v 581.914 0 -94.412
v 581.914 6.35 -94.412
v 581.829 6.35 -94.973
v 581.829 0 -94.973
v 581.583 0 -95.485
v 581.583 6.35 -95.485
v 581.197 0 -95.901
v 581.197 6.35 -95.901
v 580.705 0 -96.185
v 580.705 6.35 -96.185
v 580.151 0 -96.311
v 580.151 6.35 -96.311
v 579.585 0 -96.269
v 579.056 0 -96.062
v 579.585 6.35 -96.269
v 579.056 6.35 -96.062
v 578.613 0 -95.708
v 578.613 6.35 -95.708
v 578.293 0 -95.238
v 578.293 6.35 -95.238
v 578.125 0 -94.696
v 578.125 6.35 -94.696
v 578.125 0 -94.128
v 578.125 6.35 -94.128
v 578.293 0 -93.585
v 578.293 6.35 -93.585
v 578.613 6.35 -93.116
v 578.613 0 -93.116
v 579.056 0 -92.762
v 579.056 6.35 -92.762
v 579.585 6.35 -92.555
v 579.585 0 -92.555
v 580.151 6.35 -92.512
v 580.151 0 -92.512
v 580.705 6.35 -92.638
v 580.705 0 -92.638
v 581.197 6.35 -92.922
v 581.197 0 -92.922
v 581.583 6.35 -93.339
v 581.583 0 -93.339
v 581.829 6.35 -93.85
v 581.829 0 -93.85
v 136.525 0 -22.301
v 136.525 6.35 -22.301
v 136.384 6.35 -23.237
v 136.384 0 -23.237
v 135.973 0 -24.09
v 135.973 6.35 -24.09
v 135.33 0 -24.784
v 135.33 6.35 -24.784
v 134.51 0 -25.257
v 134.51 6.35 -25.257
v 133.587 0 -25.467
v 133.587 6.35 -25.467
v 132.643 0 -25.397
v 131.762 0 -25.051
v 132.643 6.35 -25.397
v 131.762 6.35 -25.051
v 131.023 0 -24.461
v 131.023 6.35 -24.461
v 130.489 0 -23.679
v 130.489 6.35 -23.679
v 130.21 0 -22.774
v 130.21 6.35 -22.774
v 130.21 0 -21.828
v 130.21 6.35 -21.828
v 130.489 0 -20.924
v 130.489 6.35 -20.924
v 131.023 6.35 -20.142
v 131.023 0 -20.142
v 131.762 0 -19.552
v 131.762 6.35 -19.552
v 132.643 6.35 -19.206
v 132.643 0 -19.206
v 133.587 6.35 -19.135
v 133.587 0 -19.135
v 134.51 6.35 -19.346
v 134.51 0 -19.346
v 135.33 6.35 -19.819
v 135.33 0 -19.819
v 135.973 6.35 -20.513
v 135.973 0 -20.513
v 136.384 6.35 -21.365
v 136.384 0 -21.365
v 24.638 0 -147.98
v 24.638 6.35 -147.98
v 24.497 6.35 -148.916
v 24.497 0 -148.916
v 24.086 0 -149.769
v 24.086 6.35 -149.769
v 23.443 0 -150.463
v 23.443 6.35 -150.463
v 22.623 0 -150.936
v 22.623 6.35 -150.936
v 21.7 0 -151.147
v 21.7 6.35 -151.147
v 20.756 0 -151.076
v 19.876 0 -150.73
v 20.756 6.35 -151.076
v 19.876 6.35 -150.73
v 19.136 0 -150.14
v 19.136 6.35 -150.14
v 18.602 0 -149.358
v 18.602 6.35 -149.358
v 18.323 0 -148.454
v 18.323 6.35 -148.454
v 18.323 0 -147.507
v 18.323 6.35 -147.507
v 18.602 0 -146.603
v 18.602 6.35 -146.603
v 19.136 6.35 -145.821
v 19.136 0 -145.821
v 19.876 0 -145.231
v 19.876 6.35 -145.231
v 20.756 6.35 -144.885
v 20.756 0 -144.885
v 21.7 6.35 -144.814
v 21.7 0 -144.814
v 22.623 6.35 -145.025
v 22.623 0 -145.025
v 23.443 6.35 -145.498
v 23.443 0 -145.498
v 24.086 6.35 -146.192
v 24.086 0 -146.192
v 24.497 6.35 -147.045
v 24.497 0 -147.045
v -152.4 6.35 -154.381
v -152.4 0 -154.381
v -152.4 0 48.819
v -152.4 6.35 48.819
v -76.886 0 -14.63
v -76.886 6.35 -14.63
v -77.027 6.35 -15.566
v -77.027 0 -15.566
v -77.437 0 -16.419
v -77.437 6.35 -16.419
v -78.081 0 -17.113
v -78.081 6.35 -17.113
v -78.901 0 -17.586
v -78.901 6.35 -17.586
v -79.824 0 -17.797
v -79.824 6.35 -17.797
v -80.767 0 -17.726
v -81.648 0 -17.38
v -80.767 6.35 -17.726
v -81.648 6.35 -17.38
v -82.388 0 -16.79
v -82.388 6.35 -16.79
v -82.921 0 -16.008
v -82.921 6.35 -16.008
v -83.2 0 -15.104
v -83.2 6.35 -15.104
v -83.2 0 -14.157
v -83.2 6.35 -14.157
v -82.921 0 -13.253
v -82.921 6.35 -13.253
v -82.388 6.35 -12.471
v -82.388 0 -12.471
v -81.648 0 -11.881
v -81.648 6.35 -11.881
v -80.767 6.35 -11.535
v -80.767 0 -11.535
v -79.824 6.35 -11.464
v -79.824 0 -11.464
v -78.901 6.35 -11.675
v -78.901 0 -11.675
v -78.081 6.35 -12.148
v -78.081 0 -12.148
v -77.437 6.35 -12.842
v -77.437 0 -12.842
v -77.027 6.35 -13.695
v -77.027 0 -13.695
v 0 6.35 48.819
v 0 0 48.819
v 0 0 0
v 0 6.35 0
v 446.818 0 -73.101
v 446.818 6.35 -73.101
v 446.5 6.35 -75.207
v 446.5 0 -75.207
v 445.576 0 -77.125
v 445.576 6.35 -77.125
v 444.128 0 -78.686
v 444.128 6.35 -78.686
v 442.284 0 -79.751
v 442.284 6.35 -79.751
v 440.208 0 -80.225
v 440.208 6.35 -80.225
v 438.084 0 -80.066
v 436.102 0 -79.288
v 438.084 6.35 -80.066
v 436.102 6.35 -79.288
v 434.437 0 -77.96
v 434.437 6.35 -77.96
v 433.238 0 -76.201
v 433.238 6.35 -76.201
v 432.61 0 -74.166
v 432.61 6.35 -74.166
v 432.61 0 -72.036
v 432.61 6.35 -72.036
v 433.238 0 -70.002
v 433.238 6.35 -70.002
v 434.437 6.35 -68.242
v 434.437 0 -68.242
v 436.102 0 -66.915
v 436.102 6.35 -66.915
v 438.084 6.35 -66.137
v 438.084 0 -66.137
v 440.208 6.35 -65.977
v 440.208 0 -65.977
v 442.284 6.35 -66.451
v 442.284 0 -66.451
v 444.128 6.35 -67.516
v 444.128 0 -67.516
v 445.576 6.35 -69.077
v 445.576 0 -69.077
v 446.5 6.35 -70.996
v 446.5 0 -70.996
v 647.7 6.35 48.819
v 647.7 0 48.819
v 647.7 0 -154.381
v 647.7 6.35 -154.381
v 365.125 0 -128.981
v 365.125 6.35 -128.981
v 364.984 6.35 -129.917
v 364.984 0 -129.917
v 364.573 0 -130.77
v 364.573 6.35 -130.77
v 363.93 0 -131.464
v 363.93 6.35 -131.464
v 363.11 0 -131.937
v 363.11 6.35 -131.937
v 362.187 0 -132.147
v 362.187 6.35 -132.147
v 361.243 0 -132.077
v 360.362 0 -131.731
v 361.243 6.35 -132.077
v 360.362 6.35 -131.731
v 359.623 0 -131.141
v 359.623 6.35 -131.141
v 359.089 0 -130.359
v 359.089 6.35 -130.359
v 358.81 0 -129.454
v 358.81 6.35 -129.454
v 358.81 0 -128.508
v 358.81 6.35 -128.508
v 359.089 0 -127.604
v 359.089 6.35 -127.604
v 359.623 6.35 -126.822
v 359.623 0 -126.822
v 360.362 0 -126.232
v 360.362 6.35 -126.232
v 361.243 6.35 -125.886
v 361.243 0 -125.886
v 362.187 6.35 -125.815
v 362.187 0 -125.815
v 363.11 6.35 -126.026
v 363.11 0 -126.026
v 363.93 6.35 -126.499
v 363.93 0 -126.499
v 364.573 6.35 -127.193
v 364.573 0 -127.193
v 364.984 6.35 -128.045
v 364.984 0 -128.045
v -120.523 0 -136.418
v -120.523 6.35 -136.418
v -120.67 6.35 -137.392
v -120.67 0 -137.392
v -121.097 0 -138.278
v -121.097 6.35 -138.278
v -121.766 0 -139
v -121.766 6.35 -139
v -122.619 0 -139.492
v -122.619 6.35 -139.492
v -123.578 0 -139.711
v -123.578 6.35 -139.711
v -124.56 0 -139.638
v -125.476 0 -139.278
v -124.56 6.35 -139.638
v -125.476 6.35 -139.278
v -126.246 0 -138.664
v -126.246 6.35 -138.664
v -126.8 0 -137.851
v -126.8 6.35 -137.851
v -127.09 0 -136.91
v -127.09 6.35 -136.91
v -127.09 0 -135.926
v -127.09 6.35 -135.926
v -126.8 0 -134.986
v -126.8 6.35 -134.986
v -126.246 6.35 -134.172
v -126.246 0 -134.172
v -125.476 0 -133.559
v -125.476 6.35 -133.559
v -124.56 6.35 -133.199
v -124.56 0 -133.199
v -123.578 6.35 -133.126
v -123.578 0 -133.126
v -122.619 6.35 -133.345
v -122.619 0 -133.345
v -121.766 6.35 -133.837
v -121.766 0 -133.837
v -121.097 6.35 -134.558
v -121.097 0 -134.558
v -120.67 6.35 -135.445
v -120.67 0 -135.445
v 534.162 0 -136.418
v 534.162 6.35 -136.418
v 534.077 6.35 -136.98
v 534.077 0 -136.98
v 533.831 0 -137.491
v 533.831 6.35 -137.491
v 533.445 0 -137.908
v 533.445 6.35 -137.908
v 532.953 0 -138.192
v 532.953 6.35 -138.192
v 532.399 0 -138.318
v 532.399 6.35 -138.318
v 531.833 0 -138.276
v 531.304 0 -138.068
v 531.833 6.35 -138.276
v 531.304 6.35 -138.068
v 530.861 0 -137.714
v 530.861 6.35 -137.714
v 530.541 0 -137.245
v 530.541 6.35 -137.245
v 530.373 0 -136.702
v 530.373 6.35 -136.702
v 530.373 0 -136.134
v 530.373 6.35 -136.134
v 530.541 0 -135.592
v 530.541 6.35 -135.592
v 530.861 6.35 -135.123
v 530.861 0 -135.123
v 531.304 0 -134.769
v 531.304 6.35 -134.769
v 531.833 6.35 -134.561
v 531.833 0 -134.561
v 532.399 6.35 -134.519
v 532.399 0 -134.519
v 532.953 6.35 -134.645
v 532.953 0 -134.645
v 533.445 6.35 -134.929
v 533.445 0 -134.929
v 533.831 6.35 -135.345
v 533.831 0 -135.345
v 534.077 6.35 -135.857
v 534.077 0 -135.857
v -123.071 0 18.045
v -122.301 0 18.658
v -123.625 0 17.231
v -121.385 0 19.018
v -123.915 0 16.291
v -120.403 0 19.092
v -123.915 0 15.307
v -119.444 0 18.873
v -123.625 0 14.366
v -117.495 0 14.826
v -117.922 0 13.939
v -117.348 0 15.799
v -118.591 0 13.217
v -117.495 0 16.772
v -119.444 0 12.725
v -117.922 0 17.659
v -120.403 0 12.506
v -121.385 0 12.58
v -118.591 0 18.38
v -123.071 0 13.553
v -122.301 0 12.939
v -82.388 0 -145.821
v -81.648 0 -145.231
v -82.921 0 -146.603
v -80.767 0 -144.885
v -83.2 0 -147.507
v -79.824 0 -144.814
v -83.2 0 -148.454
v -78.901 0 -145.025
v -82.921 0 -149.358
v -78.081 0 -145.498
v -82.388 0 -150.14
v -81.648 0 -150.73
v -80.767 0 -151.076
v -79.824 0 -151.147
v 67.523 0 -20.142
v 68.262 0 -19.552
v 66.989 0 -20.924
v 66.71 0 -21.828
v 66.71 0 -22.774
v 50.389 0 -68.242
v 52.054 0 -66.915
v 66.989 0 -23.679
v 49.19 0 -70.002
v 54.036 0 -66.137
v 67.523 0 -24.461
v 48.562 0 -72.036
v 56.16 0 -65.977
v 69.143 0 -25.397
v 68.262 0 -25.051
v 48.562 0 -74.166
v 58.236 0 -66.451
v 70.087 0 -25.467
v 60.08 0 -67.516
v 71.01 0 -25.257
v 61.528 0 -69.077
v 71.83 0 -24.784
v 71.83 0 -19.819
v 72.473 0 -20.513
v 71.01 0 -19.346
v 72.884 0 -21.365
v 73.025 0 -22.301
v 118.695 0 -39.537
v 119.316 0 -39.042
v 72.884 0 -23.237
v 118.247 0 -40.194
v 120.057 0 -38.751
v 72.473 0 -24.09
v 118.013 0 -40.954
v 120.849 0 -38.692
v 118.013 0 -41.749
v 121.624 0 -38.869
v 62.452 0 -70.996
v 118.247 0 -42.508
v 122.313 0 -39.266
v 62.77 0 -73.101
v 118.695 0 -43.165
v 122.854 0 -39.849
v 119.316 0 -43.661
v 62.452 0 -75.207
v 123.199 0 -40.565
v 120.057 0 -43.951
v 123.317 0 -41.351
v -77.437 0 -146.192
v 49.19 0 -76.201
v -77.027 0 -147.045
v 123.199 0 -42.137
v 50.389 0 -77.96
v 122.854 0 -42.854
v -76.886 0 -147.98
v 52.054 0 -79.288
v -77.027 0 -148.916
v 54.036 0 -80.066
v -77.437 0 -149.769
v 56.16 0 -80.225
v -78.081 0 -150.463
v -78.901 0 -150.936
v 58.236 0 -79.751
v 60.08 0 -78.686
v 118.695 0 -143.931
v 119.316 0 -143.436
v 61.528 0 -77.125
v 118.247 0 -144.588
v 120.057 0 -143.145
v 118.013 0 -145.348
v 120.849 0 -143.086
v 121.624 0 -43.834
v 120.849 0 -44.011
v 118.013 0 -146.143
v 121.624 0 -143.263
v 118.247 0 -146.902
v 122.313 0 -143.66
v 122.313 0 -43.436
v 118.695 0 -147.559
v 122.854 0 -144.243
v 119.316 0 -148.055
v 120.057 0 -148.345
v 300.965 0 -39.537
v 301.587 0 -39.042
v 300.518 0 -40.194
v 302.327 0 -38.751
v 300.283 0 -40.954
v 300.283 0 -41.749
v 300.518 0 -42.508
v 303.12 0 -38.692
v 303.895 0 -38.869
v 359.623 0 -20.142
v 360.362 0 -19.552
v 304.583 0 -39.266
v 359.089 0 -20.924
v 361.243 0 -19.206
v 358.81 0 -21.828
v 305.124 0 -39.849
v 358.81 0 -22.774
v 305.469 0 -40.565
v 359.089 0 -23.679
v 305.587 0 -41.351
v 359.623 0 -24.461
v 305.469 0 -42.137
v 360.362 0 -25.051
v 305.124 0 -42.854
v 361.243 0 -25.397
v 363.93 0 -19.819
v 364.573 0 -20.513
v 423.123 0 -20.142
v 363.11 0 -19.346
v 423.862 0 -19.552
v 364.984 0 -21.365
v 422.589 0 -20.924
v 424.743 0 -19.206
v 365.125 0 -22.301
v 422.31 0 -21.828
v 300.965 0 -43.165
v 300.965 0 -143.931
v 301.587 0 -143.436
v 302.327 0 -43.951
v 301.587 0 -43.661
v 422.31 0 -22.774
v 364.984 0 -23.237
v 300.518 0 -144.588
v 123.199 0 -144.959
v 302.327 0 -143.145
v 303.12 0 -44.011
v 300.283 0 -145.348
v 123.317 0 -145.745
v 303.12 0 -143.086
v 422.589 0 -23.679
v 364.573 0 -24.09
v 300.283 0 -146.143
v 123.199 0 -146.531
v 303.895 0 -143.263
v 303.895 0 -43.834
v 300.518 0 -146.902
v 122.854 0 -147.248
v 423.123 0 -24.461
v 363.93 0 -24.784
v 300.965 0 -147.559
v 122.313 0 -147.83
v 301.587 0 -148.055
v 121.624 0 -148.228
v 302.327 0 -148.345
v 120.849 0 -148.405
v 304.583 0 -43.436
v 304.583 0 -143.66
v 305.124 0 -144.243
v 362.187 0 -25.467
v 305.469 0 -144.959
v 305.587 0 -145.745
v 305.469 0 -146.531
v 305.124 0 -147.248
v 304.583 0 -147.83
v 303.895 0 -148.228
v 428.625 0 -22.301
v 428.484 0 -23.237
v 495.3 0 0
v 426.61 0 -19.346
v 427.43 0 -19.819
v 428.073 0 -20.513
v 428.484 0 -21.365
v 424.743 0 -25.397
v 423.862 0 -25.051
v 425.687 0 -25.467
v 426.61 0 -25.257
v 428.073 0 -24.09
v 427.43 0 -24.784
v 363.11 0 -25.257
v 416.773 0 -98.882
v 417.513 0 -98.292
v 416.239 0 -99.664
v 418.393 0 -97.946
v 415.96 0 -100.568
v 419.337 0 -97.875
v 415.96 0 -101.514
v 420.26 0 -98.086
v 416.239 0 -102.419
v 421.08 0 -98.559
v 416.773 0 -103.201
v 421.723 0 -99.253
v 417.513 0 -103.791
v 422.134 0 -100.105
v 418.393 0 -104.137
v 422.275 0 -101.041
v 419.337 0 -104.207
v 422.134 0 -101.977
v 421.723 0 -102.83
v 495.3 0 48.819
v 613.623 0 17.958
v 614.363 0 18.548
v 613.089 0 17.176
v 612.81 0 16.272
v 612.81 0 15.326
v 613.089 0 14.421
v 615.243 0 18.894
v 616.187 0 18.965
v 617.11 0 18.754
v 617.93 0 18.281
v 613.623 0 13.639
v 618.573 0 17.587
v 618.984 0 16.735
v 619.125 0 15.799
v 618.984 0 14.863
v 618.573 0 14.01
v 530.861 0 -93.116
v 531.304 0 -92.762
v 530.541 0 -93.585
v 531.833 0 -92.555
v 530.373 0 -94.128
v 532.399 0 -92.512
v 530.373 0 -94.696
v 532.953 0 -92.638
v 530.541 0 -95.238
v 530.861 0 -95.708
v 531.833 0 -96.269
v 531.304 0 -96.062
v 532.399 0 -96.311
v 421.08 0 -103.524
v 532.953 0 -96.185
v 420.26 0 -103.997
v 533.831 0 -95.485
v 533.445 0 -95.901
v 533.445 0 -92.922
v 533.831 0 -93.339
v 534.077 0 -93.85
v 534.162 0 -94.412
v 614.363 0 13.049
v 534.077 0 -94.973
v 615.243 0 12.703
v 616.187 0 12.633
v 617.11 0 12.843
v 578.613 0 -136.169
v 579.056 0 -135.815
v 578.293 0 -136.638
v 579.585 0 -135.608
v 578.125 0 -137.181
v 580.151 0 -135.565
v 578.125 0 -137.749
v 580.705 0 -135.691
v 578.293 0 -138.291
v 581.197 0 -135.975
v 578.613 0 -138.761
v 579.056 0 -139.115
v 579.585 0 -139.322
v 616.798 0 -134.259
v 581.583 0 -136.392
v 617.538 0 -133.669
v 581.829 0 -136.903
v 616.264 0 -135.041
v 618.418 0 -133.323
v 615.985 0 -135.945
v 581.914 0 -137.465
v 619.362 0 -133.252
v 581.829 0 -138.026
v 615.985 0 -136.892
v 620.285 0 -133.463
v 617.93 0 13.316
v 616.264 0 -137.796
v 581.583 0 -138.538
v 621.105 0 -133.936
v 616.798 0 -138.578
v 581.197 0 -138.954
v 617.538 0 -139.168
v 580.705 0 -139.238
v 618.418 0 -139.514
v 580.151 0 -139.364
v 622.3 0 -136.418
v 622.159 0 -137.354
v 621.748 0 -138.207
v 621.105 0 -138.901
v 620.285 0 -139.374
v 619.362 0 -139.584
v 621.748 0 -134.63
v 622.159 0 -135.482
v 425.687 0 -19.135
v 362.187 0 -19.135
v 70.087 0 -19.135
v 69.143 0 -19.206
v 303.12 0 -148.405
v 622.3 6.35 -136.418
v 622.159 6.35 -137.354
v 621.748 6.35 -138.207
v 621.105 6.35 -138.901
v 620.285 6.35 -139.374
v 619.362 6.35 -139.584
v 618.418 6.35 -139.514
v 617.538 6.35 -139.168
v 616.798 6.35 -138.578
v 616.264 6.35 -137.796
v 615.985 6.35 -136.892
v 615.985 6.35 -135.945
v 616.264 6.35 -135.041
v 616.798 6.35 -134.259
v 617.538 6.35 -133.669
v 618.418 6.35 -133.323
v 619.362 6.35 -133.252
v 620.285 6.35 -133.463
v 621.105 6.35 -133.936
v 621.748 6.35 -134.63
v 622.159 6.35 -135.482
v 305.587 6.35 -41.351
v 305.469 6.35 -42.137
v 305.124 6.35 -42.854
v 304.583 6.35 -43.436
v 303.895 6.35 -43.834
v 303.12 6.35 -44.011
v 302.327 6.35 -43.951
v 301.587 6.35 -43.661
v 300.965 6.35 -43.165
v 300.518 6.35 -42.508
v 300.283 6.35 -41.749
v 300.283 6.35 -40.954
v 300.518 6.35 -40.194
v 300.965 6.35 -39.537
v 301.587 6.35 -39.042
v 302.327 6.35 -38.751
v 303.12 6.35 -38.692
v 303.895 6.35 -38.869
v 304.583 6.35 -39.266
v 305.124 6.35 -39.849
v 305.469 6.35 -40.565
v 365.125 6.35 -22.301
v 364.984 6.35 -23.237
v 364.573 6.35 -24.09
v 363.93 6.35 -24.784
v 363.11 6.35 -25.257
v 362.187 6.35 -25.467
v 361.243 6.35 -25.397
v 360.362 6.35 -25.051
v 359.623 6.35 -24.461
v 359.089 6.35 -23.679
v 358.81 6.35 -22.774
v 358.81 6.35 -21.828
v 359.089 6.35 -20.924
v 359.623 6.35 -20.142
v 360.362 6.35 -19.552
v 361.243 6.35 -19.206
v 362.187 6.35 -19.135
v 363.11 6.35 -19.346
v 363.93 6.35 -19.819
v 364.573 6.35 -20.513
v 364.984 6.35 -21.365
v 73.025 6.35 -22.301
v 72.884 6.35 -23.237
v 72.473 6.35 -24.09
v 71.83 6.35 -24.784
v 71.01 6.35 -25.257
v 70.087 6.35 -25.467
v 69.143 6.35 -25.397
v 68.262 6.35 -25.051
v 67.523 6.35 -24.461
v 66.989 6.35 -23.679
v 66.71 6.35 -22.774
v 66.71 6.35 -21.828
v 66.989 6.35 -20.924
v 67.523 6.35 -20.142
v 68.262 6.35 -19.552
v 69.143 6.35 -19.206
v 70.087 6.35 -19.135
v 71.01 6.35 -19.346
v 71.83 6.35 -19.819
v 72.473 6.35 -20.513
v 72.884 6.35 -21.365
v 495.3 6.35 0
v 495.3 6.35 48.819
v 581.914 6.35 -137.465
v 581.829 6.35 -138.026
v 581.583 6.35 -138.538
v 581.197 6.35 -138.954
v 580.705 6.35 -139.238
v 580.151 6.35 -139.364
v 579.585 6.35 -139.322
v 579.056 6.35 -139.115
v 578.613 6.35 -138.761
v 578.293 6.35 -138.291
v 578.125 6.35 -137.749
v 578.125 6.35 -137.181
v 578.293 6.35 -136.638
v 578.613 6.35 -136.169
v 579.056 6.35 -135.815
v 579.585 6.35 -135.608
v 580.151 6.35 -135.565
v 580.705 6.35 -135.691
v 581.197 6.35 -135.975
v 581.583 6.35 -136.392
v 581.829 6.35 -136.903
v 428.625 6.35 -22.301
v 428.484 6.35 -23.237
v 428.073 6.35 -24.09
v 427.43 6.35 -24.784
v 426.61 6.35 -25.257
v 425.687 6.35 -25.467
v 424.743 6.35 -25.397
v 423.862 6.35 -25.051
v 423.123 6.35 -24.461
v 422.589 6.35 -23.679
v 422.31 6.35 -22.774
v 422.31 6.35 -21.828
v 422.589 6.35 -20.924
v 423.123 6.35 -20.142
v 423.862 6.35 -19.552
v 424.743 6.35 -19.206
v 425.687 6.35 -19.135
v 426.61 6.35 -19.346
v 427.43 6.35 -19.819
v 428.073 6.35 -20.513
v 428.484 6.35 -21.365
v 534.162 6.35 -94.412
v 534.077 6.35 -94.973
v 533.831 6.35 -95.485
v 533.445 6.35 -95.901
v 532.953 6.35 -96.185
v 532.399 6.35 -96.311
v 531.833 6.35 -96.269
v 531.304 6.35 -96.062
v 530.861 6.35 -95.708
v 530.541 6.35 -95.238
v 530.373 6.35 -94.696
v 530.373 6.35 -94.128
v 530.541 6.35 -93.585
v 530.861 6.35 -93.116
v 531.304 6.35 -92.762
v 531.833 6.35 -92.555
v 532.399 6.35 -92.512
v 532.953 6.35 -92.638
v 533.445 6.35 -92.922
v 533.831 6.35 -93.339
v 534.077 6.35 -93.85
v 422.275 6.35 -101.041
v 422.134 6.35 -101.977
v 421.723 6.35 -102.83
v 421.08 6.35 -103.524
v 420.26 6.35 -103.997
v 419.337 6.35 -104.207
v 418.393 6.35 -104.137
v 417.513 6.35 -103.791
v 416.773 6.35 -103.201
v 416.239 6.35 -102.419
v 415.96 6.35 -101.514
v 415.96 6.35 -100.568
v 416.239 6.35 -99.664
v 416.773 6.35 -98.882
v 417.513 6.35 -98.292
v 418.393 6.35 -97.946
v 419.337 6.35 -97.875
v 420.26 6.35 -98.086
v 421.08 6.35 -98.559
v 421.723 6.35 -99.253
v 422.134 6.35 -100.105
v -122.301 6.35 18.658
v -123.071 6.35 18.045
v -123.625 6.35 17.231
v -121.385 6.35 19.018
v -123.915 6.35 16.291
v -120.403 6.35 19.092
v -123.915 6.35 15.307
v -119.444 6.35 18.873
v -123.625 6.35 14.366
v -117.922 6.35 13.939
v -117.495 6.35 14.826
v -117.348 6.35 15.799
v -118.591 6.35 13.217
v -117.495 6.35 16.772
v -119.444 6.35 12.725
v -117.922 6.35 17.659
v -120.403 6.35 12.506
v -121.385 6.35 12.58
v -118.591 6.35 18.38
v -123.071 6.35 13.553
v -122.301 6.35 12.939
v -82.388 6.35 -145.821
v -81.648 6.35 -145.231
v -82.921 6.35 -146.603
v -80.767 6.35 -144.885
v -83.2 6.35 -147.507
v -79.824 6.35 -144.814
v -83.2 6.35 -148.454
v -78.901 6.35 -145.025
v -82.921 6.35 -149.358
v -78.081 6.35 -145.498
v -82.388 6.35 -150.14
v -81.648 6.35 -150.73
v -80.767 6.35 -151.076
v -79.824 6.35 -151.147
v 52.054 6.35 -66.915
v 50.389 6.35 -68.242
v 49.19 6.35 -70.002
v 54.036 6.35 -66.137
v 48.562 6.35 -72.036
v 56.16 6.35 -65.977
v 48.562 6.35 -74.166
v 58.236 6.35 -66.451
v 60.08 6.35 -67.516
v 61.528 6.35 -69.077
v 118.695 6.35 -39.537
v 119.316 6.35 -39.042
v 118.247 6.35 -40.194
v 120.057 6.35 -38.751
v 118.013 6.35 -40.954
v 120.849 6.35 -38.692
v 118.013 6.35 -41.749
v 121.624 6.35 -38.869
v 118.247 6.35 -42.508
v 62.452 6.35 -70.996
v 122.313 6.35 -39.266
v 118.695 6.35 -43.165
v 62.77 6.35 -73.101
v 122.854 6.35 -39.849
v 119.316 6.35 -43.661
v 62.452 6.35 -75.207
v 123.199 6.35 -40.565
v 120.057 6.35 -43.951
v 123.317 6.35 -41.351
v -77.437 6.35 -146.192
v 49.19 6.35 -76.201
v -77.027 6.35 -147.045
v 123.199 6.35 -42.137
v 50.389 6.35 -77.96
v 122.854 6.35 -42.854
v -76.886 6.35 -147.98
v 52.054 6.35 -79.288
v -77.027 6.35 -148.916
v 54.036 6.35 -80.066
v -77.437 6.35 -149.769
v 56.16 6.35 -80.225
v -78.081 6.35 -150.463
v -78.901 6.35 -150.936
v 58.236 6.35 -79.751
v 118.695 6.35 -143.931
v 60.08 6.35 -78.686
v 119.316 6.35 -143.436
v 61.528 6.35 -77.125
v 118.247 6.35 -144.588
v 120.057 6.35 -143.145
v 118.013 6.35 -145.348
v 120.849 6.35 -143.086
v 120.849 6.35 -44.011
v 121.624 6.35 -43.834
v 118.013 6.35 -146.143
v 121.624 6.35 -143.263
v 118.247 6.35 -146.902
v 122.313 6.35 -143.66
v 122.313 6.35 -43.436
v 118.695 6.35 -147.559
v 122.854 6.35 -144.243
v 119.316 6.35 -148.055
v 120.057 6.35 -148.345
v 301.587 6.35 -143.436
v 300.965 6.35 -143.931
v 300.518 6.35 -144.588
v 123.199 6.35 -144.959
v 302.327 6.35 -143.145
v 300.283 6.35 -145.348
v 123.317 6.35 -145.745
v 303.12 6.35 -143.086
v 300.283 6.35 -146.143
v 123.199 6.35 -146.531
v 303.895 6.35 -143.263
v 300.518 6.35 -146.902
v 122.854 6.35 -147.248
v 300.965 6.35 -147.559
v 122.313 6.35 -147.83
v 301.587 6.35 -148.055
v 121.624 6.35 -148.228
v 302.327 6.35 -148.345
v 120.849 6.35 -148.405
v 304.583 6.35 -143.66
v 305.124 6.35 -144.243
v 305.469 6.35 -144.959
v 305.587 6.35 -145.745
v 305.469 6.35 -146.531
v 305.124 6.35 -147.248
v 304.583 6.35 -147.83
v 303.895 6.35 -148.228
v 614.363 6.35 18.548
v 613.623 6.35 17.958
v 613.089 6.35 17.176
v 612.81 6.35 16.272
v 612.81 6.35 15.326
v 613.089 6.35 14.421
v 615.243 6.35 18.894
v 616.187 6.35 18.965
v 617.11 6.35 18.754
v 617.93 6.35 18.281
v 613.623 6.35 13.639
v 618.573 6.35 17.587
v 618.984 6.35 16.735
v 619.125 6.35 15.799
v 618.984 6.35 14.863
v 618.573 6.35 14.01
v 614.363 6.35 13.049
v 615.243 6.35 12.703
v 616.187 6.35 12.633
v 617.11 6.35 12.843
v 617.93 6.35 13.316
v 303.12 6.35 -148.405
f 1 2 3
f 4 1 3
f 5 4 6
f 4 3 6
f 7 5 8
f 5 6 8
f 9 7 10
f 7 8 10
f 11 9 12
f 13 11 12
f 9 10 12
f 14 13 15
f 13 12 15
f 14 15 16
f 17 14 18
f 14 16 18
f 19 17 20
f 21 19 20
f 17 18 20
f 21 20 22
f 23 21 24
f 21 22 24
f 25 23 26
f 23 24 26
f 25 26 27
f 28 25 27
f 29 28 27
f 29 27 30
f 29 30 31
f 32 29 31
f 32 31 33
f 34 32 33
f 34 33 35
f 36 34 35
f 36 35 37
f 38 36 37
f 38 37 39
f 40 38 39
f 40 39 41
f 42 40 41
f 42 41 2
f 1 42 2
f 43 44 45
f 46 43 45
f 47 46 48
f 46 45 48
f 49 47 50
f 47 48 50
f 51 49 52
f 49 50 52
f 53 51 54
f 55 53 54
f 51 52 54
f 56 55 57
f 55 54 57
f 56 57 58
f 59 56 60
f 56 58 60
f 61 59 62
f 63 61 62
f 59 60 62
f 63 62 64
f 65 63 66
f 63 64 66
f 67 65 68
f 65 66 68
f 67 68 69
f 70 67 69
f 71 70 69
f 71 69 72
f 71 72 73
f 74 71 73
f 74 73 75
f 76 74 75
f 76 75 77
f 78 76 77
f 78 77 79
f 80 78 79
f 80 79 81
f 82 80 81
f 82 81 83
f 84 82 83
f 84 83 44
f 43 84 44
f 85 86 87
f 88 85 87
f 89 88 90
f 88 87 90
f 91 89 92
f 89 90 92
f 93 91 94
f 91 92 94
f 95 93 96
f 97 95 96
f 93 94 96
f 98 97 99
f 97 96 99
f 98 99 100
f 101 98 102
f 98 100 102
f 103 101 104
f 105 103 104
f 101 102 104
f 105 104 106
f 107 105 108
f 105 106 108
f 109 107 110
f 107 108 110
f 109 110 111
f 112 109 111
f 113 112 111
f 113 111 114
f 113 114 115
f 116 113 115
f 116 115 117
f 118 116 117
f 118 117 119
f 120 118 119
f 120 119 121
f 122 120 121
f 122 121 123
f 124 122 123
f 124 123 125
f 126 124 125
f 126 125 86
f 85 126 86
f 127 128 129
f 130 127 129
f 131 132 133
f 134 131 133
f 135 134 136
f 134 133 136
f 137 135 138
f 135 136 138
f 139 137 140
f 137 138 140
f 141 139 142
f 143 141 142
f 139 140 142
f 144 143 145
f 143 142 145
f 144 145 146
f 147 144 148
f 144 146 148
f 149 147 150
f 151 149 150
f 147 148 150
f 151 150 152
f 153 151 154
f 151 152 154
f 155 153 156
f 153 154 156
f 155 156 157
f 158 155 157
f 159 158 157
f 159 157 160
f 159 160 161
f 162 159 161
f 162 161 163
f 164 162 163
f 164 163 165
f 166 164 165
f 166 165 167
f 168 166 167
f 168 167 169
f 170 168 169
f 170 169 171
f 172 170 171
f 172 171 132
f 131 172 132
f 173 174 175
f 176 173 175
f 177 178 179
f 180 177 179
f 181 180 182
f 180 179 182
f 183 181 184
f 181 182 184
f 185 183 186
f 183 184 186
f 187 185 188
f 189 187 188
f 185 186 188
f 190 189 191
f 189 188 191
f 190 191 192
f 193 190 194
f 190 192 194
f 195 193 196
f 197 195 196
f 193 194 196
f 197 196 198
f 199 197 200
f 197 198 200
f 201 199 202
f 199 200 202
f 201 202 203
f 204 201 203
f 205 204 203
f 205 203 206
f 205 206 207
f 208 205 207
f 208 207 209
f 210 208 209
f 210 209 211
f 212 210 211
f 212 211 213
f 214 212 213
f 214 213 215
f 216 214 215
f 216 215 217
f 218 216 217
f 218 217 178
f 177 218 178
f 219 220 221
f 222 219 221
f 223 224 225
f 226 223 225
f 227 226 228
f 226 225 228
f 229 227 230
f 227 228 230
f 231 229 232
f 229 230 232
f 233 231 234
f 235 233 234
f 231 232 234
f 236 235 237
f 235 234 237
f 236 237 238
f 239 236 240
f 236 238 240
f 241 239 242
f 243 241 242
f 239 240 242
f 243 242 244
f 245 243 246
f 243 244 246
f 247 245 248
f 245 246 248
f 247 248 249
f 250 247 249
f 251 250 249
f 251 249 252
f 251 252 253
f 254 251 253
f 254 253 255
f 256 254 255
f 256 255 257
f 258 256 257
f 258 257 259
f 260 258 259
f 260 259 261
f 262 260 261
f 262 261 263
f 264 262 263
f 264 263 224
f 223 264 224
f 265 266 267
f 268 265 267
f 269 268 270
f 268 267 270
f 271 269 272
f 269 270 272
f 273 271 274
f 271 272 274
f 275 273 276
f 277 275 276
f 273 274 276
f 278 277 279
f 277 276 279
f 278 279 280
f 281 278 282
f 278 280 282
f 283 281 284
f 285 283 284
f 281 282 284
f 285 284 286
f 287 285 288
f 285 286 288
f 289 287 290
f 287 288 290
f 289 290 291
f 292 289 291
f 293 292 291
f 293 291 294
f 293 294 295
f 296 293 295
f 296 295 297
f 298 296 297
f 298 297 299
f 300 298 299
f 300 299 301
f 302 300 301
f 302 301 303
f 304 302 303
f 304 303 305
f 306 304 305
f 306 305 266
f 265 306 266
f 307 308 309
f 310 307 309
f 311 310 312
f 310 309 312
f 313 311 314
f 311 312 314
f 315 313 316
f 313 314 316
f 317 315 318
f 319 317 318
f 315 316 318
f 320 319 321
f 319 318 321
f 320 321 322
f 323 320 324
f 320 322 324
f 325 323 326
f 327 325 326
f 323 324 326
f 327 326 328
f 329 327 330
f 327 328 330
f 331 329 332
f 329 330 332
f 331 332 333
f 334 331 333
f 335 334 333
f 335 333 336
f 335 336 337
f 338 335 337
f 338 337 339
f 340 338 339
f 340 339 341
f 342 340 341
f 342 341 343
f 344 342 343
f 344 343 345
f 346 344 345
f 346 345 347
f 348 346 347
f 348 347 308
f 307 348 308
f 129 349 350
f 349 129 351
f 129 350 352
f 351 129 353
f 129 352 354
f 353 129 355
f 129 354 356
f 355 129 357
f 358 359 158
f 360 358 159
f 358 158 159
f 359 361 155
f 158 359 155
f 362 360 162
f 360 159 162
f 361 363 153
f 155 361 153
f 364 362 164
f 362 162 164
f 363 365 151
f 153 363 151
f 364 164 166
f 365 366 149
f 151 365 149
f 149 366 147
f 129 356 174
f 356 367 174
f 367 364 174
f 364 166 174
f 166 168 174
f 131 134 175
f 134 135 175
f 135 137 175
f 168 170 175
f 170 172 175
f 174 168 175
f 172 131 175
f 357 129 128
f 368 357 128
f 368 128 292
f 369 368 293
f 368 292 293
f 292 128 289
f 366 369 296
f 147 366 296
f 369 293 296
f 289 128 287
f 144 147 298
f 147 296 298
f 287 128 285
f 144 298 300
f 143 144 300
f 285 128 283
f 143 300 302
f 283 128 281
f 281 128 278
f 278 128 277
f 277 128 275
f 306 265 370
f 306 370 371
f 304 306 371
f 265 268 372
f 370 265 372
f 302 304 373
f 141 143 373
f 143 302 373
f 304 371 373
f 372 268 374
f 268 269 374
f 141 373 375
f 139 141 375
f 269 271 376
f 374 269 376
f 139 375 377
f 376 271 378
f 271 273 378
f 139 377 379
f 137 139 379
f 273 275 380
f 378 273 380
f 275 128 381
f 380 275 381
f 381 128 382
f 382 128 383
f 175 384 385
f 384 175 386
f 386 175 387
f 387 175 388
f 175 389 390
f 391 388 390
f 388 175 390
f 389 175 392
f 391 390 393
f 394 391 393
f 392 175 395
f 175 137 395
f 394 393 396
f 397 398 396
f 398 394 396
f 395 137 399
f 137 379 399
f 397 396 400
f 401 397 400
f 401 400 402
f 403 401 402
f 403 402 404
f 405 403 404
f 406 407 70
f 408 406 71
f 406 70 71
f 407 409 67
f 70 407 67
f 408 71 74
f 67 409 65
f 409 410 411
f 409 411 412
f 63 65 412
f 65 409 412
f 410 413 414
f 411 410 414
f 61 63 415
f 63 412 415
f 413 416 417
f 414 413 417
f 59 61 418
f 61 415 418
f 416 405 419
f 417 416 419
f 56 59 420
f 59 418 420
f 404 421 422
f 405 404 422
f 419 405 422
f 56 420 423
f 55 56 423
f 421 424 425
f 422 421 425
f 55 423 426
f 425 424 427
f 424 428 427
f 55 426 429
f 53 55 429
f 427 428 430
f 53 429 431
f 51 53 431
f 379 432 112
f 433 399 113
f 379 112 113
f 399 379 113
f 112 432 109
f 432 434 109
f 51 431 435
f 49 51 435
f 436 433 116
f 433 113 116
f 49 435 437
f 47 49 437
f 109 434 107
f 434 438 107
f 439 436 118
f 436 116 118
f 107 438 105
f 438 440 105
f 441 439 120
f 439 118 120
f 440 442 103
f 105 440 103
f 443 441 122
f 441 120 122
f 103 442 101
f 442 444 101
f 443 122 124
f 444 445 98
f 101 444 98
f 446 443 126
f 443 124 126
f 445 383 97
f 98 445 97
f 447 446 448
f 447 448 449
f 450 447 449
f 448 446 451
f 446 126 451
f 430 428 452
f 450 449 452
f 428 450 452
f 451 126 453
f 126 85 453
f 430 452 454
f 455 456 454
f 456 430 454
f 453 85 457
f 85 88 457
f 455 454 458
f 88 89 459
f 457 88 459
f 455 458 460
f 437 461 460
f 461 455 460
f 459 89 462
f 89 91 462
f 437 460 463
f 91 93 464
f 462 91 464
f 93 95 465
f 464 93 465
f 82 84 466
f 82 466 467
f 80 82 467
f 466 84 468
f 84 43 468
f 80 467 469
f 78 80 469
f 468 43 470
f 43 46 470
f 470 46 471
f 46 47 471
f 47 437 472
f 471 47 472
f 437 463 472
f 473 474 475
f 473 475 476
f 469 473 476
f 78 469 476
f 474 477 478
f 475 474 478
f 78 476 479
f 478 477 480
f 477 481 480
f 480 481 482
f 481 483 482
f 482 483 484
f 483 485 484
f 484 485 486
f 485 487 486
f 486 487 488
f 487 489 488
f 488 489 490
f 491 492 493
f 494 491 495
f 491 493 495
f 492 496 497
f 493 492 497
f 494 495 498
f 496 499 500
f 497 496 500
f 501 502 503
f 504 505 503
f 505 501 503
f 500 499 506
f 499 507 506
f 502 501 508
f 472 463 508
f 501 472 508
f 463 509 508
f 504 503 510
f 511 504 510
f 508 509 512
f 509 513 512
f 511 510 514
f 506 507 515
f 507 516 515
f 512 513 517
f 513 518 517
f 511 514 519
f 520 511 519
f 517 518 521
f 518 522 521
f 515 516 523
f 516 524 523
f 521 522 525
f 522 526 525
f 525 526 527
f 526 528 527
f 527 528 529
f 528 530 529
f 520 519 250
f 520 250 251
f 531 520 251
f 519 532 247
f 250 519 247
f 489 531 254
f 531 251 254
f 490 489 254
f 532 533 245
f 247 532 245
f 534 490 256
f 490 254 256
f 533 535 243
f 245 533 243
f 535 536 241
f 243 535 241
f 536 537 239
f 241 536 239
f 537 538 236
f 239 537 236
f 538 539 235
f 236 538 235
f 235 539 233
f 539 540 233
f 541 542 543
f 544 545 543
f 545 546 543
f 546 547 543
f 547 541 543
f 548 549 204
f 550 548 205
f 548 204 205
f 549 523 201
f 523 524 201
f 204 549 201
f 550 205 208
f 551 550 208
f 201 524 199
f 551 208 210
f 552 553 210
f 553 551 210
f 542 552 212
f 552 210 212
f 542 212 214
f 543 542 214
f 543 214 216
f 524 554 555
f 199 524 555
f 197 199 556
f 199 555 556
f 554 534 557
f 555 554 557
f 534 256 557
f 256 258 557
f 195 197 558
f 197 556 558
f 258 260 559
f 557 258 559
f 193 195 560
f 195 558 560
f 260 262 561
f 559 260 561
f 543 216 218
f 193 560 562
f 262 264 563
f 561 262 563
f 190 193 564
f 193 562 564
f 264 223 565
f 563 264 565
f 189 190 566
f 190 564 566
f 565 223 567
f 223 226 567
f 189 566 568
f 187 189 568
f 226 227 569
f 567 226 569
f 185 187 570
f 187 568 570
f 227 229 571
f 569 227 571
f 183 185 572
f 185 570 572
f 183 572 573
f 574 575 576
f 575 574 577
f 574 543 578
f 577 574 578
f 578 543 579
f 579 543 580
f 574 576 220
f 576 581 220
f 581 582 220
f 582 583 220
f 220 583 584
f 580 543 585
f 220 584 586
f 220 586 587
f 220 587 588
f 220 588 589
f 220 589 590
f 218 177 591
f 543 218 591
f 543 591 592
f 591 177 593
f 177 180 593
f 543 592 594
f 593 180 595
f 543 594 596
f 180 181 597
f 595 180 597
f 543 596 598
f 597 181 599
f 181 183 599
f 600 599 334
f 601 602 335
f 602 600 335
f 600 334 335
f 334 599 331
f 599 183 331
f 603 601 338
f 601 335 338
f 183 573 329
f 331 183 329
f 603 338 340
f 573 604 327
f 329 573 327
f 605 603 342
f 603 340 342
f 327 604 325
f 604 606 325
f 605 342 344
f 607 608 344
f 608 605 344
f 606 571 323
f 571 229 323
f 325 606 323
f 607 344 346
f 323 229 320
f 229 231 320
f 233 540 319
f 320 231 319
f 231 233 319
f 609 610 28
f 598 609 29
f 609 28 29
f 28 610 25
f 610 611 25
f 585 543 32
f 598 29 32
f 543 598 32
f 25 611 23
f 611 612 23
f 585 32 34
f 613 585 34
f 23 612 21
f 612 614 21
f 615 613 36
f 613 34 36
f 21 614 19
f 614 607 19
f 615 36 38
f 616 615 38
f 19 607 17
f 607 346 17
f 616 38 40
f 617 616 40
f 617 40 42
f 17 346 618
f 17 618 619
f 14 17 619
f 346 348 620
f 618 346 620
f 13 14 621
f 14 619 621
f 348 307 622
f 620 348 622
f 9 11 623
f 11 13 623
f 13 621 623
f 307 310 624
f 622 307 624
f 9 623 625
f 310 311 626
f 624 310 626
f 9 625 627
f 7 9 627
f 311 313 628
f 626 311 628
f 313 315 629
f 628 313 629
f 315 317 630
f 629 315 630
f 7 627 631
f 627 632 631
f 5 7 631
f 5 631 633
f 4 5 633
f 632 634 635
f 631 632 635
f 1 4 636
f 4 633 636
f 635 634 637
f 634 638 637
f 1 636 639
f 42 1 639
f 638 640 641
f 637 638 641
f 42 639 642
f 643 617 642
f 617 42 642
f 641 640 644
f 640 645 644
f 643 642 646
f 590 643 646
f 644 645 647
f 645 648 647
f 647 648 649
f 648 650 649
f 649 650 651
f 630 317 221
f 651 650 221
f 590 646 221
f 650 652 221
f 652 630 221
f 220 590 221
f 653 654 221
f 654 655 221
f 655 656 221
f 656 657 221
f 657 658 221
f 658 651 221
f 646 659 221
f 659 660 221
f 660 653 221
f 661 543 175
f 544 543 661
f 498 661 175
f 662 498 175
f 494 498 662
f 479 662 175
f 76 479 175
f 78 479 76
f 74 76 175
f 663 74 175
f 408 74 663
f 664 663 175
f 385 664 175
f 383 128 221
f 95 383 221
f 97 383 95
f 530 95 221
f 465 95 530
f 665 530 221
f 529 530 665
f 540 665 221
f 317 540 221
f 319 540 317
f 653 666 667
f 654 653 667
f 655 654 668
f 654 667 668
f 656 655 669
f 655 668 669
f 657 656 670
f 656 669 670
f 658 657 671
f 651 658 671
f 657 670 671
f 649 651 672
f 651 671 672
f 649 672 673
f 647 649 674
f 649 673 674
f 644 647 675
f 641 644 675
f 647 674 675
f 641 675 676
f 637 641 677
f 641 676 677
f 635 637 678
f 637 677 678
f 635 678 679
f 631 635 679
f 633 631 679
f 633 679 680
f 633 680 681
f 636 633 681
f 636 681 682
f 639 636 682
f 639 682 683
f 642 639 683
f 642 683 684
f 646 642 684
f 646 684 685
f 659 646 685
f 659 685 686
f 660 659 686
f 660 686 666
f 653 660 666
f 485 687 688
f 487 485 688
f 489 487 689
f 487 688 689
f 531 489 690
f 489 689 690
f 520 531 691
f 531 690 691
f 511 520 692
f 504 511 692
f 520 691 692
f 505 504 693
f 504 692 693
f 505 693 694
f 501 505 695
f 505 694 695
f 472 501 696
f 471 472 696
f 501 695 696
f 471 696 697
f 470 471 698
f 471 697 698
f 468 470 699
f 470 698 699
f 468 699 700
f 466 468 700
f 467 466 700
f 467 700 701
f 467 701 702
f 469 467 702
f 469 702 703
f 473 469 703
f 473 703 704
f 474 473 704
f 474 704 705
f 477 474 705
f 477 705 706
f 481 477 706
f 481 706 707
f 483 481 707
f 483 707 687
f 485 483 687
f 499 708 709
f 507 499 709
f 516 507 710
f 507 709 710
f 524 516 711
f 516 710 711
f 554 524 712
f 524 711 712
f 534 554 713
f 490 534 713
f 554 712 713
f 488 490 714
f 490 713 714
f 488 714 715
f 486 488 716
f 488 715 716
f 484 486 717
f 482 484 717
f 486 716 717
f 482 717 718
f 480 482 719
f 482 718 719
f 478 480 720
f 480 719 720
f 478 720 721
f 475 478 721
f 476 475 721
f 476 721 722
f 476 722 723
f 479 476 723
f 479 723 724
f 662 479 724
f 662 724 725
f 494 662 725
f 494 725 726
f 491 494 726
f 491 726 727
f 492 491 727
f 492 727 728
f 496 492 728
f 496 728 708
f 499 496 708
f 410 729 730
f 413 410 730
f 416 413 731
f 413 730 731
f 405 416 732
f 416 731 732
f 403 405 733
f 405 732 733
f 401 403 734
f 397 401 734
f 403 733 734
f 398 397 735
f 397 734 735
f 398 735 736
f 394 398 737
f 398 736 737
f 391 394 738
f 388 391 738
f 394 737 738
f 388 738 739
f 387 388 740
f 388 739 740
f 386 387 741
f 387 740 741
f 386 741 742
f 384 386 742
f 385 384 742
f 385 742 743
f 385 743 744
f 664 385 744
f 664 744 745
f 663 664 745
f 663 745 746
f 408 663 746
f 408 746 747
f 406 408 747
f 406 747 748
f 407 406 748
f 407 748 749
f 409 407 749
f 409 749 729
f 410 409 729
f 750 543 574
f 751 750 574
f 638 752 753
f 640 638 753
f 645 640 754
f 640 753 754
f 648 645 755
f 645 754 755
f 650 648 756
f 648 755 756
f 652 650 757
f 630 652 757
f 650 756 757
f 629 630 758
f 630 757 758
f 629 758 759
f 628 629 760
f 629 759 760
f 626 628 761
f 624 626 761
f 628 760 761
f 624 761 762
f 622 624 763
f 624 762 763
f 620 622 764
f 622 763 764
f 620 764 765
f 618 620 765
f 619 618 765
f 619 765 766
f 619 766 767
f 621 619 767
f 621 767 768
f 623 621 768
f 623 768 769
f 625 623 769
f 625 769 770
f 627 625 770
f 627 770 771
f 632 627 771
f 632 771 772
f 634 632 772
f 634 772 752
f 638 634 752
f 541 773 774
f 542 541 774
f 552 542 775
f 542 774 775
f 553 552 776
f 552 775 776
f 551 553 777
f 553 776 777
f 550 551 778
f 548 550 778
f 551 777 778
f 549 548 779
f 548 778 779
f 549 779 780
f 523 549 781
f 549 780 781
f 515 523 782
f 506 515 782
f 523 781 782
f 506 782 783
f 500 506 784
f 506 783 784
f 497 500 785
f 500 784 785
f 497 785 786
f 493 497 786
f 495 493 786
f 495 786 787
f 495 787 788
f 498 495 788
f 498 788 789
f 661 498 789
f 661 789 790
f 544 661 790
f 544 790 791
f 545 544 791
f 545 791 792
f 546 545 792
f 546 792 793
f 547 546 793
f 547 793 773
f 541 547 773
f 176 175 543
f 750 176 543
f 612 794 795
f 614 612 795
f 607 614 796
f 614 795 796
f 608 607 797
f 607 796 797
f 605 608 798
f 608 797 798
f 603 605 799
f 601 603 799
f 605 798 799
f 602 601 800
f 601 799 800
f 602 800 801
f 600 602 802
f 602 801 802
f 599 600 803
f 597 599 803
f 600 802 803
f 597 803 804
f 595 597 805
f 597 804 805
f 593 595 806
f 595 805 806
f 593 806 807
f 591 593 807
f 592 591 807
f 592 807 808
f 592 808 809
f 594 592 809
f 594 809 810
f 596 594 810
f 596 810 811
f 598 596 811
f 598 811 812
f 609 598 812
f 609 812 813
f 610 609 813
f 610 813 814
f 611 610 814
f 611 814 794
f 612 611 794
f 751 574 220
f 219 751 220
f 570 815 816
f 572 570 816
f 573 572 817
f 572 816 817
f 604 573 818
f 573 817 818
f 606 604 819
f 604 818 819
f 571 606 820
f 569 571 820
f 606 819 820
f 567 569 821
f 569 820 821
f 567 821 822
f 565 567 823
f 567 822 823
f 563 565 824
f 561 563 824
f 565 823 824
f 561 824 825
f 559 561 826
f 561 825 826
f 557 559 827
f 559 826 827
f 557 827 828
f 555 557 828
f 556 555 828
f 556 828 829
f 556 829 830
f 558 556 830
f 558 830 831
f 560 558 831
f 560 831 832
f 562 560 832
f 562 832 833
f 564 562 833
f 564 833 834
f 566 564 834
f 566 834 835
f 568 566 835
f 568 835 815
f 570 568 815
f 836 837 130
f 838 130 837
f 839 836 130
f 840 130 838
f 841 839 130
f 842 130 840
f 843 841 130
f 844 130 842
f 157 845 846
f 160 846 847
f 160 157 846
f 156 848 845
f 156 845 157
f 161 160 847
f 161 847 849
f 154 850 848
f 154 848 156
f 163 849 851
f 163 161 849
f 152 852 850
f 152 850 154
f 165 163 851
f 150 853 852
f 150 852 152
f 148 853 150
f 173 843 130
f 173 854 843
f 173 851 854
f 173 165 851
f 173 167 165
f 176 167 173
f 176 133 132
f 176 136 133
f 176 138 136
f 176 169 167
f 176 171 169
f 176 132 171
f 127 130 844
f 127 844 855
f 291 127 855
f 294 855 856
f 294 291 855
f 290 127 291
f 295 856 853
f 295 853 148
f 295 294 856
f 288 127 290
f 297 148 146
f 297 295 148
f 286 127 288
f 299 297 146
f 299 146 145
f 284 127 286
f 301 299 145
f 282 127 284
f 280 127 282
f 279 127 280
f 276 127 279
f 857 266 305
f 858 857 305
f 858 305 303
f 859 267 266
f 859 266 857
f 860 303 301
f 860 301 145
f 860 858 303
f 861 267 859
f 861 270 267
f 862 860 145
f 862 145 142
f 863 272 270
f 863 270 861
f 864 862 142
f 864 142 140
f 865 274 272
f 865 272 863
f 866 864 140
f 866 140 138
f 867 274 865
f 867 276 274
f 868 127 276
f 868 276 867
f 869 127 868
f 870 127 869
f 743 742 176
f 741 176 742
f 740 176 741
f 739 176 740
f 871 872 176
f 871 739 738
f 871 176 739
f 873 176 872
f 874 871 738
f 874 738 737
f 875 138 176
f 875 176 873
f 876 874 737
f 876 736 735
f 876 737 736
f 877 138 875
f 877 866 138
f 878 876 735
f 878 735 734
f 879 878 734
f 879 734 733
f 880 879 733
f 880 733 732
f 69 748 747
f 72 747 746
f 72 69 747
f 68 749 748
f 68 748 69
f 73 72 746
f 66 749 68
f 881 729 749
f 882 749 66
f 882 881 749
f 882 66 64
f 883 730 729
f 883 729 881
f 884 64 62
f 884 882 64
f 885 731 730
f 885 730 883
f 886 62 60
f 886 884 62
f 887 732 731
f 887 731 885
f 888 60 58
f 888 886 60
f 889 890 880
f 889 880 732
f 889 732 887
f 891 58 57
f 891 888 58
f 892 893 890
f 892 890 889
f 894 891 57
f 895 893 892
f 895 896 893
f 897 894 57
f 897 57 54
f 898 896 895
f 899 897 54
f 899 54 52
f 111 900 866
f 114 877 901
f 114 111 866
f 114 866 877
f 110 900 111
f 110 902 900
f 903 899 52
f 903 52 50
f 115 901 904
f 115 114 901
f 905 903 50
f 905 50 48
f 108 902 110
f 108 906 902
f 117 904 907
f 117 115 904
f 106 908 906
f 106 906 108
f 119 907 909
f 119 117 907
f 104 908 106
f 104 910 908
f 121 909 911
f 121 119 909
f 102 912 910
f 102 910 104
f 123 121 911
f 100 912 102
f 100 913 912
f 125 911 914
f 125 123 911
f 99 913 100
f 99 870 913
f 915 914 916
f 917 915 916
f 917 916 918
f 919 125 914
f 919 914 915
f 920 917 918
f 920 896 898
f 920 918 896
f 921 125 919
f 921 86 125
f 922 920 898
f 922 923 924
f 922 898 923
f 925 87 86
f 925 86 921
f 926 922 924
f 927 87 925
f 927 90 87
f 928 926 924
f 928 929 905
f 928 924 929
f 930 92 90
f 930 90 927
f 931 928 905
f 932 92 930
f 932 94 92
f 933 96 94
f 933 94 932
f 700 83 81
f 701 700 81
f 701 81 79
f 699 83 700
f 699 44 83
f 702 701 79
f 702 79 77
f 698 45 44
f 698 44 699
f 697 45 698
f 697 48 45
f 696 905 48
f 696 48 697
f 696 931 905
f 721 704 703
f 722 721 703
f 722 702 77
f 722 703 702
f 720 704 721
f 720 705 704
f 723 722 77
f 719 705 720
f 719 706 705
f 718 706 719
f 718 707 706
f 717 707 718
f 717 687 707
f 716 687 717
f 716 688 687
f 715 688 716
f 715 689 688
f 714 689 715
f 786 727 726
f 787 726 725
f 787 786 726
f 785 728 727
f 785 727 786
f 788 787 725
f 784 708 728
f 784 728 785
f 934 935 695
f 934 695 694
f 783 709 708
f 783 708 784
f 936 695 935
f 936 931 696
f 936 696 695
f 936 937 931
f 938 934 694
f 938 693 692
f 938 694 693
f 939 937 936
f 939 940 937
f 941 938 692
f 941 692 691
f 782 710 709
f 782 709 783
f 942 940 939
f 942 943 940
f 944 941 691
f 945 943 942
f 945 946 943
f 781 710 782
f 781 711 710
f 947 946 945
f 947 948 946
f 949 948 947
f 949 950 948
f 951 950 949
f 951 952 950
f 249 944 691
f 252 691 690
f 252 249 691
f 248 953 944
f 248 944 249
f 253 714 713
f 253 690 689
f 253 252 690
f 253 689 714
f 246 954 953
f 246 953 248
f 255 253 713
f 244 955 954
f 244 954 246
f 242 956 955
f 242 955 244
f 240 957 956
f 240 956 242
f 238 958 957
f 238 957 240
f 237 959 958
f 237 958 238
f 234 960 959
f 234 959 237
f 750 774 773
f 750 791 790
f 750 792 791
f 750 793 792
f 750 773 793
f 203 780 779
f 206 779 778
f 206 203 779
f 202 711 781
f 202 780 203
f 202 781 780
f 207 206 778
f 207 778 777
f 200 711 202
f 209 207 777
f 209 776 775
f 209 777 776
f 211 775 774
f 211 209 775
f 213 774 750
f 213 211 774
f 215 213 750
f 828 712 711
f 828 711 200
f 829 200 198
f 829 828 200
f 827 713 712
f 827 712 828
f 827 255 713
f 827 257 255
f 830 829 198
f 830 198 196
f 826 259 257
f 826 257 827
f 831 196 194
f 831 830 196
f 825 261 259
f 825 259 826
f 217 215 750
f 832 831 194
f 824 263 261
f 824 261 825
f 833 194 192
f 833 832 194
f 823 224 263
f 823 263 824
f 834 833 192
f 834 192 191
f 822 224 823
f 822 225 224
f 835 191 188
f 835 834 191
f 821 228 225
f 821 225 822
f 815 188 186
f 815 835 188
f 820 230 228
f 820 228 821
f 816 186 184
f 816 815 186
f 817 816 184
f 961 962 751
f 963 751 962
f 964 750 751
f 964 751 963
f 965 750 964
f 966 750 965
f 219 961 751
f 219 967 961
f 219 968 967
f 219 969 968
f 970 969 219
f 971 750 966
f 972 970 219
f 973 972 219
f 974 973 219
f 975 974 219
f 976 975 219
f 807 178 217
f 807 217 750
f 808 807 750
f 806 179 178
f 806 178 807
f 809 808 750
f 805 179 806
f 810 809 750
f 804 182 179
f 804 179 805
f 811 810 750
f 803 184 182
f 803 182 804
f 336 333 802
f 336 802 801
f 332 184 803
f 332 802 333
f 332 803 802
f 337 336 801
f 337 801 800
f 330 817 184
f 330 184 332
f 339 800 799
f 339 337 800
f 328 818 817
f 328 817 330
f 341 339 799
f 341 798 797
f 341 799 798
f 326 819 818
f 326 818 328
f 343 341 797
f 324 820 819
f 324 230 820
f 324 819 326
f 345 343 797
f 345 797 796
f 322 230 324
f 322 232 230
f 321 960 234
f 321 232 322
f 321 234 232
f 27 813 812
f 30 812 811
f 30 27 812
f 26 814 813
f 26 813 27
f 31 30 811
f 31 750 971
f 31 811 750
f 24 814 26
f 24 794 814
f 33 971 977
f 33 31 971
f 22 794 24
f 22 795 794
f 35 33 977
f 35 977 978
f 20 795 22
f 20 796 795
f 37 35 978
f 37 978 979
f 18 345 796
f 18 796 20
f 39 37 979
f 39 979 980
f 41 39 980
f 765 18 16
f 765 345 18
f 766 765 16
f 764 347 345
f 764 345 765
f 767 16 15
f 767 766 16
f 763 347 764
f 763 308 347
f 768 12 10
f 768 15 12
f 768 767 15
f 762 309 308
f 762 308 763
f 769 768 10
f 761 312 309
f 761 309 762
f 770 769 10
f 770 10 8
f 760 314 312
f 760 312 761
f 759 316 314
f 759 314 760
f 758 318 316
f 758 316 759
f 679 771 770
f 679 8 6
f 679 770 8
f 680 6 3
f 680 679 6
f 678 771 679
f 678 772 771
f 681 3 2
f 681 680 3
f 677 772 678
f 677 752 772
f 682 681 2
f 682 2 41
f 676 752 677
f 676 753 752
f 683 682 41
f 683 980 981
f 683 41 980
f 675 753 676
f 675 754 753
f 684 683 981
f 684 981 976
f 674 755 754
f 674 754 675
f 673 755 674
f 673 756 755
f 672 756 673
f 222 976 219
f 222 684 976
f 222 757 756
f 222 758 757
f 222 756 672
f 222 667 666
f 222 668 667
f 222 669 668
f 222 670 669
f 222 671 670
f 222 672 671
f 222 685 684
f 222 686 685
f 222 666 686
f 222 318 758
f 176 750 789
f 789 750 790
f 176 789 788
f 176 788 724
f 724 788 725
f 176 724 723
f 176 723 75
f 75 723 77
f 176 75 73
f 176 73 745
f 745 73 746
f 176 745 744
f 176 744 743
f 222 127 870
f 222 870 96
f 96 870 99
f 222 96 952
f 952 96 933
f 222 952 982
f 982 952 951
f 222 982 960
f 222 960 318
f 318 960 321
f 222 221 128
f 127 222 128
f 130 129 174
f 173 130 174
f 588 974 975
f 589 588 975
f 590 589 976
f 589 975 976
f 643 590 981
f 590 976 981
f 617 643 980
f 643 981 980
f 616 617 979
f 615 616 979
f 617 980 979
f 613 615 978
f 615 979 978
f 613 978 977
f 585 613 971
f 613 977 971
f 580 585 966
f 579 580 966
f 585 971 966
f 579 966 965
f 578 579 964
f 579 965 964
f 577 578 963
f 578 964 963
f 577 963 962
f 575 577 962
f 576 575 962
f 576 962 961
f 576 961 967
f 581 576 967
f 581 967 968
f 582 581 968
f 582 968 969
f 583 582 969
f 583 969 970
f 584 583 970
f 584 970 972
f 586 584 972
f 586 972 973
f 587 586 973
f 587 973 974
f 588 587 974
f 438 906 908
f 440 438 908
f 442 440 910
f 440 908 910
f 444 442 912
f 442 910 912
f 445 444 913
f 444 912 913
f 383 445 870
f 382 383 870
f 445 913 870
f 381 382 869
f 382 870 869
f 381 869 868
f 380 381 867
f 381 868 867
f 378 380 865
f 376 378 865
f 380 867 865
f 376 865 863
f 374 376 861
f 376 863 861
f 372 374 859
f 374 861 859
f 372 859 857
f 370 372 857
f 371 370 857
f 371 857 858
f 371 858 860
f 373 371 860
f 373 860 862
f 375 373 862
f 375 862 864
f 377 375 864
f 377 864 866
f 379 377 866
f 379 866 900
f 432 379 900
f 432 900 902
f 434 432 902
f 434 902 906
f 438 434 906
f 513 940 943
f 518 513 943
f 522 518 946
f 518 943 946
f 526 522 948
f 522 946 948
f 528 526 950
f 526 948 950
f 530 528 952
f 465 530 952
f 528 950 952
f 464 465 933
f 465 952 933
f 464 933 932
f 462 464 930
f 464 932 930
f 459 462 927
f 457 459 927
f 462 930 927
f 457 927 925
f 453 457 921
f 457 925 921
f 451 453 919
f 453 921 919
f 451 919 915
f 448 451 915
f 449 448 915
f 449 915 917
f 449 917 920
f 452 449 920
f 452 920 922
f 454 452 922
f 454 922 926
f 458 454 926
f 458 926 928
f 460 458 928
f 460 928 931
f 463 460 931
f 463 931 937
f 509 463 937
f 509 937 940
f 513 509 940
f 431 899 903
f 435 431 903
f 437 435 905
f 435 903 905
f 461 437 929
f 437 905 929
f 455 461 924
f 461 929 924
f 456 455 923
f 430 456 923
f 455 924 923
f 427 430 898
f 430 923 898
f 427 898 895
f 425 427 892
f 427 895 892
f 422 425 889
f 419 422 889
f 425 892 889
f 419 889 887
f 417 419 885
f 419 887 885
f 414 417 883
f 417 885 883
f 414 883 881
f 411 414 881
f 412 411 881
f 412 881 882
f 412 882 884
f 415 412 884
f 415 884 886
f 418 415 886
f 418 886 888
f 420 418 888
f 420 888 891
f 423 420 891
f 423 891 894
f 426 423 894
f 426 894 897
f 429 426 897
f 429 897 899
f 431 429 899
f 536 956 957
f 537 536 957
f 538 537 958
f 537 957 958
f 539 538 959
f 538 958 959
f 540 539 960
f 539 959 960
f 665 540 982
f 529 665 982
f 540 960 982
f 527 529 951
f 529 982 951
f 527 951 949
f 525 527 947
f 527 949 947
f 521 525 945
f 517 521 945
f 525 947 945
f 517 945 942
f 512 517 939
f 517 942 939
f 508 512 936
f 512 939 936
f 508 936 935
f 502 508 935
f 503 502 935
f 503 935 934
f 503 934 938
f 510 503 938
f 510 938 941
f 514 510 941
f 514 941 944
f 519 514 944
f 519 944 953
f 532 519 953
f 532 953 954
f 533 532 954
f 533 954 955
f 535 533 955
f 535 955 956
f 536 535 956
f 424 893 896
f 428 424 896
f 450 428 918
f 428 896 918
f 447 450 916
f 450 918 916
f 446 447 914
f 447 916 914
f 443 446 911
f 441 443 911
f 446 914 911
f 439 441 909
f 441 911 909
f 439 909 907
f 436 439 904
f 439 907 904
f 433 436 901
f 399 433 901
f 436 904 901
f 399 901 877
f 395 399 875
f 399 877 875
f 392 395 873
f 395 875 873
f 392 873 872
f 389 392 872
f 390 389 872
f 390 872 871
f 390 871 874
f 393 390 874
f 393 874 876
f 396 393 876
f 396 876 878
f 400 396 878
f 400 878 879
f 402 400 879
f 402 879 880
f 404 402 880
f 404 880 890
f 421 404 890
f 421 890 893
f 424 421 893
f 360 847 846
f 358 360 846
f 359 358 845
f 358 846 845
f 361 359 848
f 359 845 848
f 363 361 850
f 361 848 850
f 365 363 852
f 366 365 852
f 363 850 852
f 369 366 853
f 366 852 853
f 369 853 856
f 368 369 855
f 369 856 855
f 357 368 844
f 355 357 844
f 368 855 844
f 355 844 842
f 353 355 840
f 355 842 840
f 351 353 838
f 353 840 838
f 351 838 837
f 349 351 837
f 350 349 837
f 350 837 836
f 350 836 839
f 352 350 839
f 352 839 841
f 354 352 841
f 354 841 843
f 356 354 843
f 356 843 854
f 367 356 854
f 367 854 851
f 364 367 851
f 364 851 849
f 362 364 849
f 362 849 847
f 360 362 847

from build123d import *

# Parameters (mm, degrees)
BOSS_EXTRUDE1_DEPTH = 6.35
SKETCH3_R           = 3.302
SKETCH3_R_2         = 3.175
SKETCH3_R_3         = 7.14375
SKETCH3_R_4         = 1.905
CUT_EXTRUDE1_DEPTH  = 7.62
SKETCH5_R           = 2.667
SKETCH5_R_2         = 3.175
CUT_EXTRUDE2_DEPTH  = 7.62


with BuildPart() as part:
    # Sketch1 → Boss-Extrude1 (new body)
    with BuildSketch(Plane(origin=(0, 0, 0), x_dir=(1, 0, 0), z_dir=(0, 1, 0))):
        Polygon((0, 0), (495.3, 0), (495.3, -48.8188), (647.7, -48.8188), (647.7, 154.3812), (-152.4, 154.3812), (-152.4, -48.8188), (0, -48.8188), align=None)
    extrude(amount=BOSS_EXTRUDE1_DEPTH)

    # Sketch3 → Cut-Extrude1 (cut)
    with BuildSketch(Plane(origin=(0, 6.35, 0), x_dir=(1, 0, 0), z_dir=(0, 1, 0))):
        with Locations((-120.65, -15.7988)):
            Circle(SKETCH3_R)
        with Locations((-80.0608, 14.6304)):
            Circle(SKETCH3_R_2)
        with Locations((-123.825, 136.41832)):
            Circle(SKETCH3_R)
        with Locations((-80.0608, 147.9804)):
            Circle(SKETCH3_R_2)
        with Locations((21.463, 147.9804)):
            Circle(SKETCH3_R_2)
        with Locations((55.626, 73.1012)):
            Circle(SKETCH3_R_3)
        with Locations((619.125, 136.41832)):
            Circle(SKETCH3_R_2)
        with Locations((615.95, -15.7988)):
            Circle(SKETCH3_R_2)
        with Locations((580.009, 137.4648)):
            Circle(SKETCH3_R_4)
        with Locations((532.257, 94.4118)):
            Circle(SKETCH3_R_4)
        with Locations((580.009, 94.4118)):
            Circle(SKETCH3_R_4)
        with Locations((532.257, 136.41832)):
            Circle(SKETCH3_R_4)
        with Locations((439.674, 73.1012)):
            Circle(SKETCH3_R_3)
    extrude(amount=-CUT_EXTRUDE1_DEPTH, mode=Mode.SUBTRACT)

    # Sketch5 → Cut-Extrude2 (cut)
    with BuildSketch(Plane(origin=(0, 6.35, 0), x_dir=(1, 0, 0), z_dir=(0, 1, 0))):
        with Locations((120.65, 145.7452)):
            Circle(SKETCH5_R)
        with Locations((120.65, 41.3512)):
            Circle(SKETCH5_R)
        with Locations((419.1, 101.0412)):
            Circle(SKETCH5_R_2)
        with Locations((425.45, 22.3012)):
            Circle(SKETCH5_R_2)
        with Locations((361.95, 128.9812)):
            Circle(SKETCH5_R_2)
        with Locations((361.95, 22.3012)):
            Circle(SKETCH5_R_2)
        with Locations((302.9204, 145.7452)):
            Circle(SKETCH5_R)
        with Locations((302.9204, 41.3512)):
            Circle(SKETCH5_R)
        with Locations((133.35, 22.3012)):
            Circle(SKETCH5_R_2)
        with Locations((69.85, 22.3012)):
            Circle(SKETCH5_R_2)
    extrude(amount=-CUT_EXTRUDE2_DEPTH, mode=Mode.SUBTRACT)


solid = part.part
